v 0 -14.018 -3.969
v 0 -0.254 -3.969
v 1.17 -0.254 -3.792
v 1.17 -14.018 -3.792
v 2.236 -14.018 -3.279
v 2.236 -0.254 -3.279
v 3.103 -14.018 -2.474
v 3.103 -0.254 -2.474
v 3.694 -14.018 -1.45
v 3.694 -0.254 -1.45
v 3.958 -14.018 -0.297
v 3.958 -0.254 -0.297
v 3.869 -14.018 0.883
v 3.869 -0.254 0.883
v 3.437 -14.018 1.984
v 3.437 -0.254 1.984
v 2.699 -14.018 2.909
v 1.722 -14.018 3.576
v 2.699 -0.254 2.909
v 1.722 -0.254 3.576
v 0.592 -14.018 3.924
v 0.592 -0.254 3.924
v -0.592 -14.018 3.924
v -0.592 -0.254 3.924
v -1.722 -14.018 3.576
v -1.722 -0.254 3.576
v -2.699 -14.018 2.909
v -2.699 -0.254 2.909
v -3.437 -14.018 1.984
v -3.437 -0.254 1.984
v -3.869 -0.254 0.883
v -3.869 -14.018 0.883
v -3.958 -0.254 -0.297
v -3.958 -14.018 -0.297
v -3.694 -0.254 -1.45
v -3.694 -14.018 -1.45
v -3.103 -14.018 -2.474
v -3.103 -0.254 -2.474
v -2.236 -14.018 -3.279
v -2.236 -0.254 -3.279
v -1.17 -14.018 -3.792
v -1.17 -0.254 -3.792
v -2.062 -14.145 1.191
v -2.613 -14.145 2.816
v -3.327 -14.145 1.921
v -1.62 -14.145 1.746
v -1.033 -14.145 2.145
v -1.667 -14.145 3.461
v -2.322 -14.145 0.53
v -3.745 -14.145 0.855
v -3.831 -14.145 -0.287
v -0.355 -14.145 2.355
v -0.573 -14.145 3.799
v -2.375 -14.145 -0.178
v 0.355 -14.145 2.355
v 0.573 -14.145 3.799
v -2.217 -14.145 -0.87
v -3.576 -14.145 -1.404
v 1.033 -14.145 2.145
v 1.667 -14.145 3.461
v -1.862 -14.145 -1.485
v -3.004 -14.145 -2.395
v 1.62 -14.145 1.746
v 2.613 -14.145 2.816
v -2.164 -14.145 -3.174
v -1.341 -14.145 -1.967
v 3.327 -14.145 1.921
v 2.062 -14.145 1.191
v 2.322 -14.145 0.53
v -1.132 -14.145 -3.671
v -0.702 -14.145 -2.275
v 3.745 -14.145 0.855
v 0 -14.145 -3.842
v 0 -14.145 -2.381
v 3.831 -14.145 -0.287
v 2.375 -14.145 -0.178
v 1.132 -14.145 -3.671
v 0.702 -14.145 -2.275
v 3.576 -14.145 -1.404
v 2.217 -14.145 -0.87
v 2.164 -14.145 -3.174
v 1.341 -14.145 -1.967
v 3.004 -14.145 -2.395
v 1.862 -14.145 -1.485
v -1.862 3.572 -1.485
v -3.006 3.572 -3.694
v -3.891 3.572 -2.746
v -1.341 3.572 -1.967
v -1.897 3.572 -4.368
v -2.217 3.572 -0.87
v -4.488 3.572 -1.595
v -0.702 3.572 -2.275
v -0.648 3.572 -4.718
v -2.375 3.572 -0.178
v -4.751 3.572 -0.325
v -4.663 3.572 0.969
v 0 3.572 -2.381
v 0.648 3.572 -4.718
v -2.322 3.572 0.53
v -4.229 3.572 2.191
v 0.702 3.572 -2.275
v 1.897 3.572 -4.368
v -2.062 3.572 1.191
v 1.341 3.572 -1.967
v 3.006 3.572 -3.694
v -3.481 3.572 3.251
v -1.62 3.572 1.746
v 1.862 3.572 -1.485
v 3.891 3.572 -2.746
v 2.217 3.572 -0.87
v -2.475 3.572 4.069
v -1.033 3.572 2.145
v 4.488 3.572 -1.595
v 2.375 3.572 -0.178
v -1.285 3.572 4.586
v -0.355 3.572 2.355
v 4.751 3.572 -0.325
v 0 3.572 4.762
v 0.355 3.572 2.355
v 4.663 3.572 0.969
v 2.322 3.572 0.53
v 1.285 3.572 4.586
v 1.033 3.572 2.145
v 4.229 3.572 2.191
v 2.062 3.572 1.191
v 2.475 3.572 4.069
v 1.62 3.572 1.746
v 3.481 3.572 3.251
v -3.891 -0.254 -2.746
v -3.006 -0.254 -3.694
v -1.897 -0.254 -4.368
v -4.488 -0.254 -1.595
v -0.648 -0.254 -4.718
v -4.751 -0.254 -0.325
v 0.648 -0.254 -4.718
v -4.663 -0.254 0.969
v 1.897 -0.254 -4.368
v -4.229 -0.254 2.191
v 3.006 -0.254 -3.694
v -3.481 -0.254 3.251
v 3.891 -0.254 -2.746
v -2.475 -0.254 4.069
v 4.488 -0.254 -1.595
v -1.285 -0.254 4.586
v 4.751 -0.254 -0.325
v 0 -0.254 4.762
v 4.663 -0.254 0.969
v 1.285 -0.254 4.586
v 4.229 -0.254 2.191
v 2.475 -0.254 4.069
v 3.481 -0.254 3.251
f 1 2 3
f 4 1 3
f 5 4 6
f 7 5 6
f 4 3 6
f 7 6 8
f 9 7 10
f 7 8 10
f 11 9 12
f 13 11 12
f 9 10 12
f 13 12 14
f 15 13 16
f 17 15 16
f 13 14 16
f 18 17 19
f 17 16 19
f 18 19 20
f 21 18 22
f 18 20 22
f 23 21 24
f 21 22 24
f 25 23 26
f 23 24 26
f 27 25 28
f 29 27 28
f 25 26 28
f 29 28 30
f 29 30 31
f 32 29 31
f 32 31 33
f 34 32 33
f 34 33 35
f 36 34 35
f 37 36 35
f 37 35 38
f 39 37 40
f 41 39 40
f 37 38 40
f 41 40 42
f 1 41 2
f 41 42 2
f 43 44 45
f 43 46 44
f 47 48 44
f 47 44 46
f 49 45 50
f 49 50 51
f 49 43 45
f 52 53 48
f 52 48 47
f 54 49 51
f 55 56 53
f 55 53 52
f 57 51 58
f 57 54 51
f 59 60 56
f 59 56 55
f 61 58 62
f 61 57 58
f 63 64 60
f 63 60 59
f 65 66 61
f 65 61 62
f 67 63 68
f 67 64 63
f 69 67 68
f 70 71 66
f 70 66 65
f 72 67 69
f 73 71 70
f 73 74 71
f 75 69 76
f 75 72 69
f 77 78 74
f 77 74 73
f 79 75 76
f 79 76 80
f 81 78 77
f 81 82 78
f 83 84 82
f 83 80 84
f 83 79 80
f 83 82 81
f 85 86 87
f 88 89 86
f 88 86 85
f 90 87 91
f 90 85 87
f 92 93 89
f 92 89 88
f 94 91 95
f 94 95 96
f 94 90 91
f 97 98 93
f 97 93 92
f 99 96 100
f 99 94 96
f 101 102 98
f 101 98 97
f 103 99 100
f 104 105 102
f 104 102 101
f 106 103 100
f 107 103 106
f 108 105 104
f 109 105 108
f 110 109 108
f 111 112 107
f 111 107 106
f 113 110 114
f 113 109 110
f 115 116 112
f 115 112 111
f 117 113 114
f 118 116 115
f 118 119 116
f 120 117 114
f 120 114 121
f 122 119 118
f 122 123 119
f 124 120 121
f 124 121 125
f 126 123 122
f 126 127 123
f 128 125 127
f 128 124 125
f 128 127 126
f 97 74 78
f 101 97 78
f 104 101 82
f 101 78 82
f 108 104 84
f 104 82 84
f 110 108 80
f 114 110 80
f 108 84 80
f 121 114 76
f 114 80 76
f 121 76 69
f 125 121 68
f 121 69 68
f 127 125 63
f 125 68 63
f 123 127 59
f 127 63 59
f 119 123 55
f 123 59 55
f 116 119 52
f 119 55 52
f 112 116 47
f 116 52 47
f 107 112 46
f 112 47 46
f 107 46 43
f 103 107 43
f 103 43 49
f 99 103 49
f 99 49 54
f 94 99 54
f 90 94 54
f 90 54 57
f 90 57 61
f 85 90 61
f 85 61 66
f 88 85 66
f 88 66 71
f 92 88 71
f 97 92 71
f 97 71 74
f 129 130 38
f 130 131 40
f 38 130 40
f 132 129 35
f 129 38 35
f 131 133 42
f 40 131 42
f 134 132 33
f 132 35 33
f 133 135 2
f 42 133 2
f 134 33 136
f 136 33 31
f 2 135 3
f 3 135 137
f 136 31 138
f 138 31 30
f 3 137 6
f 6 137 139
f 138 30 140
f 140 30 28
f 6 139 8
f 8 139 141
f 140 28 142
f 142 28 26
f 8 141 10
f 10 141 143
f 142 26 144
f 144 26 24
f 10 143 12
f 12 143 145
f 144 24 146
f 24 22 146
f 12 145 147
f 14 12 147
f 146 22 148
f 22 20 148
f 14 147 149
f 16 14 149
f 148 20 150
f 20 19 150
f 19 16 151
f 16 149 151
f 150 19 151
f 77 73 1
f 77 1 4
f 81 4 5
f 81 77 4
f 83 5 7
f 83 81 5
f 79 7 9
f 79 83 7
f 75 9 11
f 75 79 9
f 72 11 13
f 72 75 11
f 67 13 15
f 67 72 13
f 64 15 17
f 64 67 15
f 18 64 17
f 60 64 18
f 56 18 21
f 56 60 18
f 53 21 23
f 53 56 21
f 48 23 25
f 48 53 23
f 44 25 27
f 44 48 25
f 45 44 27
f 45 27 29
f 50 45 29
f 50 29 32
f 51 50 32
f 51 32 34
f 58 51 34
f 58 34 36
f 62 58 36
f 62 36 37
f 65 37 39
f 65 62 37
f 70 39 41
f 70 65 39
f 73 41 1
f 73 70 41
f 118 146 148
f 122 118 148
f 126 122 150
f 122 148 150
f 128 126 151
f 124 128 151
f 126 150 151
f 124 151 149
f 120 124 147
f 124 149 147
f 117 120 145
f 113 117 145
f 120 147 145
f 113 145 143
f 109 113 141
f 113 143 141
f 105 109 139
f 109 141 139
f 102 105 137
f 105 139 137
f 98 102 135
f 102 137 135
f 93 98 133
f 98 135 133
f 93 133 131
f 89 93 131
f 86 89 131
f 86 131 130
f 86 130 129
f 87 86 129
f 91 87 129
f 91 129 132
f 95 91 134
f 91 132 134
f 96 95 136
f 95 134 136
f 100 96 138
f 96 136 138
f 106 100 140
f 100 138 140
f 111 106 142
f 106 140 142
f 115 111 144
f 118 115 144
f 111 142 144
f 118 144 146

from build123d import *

# Parameters (mm, degrees)
BOSS_EXTRUDE1_DEPTH      = 3.571875
BOSS_EXTRUDE1_DEPTH_BACK = 0.254
SKETCH1_R                = 4.7625
SKETCH2_R                = 3.96875
BOSS_EXTRUDE2_DEPTH      = 13.890625
SKETCH3_R                = 2.38125
CUT_EXTRUDE1_DEPTH       = 19.953553354
CHAMFER1_SIZE            = 0.127


with BuildPart() as part:
    # Sketch1 → Boss-Extrude1 (new, two sides: drawn at the far end of the back side and taken through both)
    with BuildSketch(Plane(origin=(0, 0, 0), x_dir=(1, 0, 0), z_dir=(0, 1, 0)).offset(-BOSS_EXTRUDE1_DEPTH_BACK)):
        with Locations(Location((0, 0, 0), (0, 0, 270))):
            Circle(SKETCH1_R)
    extrude(amount=BOSS_EXTRUDE1_DEPTH + BOSS_EXTRUDE1_DEPTH_BACK)

    # Sketch2 → Boss-Extrude2 (add)
    with BuildSketch(Plane.XZ.offset(0.254)):
        with Locations(Location((0, 0, 0), (0, 0, 270))):
            Circle(SKETCH2_R)
    extrude(amount=BOSS_EXTRUDE2_DEPTH)

    # Sketch3 → Cut-Extrude1 (cut, through all)
    with BuildSketch(Plane.XZ.offset(14.144625)):
        with Locations(Location((0, 0, 0), (0, 0, 270))):
            Circle(SKETCH3_R)
    extrude(amount=-CUT_EXTRUDE1_DEPTH, mode=Mode.SUBTRACT)

    # Chamfer1
    chamfer1_edges = [part.edges().sort_by_distance(p)[0] for p in [
        (0, -14.144625, 3.96875),
    ]]
    chamfer(chamfer1_edges, length=CHAMFER1_SIZE)


solid = part.part
